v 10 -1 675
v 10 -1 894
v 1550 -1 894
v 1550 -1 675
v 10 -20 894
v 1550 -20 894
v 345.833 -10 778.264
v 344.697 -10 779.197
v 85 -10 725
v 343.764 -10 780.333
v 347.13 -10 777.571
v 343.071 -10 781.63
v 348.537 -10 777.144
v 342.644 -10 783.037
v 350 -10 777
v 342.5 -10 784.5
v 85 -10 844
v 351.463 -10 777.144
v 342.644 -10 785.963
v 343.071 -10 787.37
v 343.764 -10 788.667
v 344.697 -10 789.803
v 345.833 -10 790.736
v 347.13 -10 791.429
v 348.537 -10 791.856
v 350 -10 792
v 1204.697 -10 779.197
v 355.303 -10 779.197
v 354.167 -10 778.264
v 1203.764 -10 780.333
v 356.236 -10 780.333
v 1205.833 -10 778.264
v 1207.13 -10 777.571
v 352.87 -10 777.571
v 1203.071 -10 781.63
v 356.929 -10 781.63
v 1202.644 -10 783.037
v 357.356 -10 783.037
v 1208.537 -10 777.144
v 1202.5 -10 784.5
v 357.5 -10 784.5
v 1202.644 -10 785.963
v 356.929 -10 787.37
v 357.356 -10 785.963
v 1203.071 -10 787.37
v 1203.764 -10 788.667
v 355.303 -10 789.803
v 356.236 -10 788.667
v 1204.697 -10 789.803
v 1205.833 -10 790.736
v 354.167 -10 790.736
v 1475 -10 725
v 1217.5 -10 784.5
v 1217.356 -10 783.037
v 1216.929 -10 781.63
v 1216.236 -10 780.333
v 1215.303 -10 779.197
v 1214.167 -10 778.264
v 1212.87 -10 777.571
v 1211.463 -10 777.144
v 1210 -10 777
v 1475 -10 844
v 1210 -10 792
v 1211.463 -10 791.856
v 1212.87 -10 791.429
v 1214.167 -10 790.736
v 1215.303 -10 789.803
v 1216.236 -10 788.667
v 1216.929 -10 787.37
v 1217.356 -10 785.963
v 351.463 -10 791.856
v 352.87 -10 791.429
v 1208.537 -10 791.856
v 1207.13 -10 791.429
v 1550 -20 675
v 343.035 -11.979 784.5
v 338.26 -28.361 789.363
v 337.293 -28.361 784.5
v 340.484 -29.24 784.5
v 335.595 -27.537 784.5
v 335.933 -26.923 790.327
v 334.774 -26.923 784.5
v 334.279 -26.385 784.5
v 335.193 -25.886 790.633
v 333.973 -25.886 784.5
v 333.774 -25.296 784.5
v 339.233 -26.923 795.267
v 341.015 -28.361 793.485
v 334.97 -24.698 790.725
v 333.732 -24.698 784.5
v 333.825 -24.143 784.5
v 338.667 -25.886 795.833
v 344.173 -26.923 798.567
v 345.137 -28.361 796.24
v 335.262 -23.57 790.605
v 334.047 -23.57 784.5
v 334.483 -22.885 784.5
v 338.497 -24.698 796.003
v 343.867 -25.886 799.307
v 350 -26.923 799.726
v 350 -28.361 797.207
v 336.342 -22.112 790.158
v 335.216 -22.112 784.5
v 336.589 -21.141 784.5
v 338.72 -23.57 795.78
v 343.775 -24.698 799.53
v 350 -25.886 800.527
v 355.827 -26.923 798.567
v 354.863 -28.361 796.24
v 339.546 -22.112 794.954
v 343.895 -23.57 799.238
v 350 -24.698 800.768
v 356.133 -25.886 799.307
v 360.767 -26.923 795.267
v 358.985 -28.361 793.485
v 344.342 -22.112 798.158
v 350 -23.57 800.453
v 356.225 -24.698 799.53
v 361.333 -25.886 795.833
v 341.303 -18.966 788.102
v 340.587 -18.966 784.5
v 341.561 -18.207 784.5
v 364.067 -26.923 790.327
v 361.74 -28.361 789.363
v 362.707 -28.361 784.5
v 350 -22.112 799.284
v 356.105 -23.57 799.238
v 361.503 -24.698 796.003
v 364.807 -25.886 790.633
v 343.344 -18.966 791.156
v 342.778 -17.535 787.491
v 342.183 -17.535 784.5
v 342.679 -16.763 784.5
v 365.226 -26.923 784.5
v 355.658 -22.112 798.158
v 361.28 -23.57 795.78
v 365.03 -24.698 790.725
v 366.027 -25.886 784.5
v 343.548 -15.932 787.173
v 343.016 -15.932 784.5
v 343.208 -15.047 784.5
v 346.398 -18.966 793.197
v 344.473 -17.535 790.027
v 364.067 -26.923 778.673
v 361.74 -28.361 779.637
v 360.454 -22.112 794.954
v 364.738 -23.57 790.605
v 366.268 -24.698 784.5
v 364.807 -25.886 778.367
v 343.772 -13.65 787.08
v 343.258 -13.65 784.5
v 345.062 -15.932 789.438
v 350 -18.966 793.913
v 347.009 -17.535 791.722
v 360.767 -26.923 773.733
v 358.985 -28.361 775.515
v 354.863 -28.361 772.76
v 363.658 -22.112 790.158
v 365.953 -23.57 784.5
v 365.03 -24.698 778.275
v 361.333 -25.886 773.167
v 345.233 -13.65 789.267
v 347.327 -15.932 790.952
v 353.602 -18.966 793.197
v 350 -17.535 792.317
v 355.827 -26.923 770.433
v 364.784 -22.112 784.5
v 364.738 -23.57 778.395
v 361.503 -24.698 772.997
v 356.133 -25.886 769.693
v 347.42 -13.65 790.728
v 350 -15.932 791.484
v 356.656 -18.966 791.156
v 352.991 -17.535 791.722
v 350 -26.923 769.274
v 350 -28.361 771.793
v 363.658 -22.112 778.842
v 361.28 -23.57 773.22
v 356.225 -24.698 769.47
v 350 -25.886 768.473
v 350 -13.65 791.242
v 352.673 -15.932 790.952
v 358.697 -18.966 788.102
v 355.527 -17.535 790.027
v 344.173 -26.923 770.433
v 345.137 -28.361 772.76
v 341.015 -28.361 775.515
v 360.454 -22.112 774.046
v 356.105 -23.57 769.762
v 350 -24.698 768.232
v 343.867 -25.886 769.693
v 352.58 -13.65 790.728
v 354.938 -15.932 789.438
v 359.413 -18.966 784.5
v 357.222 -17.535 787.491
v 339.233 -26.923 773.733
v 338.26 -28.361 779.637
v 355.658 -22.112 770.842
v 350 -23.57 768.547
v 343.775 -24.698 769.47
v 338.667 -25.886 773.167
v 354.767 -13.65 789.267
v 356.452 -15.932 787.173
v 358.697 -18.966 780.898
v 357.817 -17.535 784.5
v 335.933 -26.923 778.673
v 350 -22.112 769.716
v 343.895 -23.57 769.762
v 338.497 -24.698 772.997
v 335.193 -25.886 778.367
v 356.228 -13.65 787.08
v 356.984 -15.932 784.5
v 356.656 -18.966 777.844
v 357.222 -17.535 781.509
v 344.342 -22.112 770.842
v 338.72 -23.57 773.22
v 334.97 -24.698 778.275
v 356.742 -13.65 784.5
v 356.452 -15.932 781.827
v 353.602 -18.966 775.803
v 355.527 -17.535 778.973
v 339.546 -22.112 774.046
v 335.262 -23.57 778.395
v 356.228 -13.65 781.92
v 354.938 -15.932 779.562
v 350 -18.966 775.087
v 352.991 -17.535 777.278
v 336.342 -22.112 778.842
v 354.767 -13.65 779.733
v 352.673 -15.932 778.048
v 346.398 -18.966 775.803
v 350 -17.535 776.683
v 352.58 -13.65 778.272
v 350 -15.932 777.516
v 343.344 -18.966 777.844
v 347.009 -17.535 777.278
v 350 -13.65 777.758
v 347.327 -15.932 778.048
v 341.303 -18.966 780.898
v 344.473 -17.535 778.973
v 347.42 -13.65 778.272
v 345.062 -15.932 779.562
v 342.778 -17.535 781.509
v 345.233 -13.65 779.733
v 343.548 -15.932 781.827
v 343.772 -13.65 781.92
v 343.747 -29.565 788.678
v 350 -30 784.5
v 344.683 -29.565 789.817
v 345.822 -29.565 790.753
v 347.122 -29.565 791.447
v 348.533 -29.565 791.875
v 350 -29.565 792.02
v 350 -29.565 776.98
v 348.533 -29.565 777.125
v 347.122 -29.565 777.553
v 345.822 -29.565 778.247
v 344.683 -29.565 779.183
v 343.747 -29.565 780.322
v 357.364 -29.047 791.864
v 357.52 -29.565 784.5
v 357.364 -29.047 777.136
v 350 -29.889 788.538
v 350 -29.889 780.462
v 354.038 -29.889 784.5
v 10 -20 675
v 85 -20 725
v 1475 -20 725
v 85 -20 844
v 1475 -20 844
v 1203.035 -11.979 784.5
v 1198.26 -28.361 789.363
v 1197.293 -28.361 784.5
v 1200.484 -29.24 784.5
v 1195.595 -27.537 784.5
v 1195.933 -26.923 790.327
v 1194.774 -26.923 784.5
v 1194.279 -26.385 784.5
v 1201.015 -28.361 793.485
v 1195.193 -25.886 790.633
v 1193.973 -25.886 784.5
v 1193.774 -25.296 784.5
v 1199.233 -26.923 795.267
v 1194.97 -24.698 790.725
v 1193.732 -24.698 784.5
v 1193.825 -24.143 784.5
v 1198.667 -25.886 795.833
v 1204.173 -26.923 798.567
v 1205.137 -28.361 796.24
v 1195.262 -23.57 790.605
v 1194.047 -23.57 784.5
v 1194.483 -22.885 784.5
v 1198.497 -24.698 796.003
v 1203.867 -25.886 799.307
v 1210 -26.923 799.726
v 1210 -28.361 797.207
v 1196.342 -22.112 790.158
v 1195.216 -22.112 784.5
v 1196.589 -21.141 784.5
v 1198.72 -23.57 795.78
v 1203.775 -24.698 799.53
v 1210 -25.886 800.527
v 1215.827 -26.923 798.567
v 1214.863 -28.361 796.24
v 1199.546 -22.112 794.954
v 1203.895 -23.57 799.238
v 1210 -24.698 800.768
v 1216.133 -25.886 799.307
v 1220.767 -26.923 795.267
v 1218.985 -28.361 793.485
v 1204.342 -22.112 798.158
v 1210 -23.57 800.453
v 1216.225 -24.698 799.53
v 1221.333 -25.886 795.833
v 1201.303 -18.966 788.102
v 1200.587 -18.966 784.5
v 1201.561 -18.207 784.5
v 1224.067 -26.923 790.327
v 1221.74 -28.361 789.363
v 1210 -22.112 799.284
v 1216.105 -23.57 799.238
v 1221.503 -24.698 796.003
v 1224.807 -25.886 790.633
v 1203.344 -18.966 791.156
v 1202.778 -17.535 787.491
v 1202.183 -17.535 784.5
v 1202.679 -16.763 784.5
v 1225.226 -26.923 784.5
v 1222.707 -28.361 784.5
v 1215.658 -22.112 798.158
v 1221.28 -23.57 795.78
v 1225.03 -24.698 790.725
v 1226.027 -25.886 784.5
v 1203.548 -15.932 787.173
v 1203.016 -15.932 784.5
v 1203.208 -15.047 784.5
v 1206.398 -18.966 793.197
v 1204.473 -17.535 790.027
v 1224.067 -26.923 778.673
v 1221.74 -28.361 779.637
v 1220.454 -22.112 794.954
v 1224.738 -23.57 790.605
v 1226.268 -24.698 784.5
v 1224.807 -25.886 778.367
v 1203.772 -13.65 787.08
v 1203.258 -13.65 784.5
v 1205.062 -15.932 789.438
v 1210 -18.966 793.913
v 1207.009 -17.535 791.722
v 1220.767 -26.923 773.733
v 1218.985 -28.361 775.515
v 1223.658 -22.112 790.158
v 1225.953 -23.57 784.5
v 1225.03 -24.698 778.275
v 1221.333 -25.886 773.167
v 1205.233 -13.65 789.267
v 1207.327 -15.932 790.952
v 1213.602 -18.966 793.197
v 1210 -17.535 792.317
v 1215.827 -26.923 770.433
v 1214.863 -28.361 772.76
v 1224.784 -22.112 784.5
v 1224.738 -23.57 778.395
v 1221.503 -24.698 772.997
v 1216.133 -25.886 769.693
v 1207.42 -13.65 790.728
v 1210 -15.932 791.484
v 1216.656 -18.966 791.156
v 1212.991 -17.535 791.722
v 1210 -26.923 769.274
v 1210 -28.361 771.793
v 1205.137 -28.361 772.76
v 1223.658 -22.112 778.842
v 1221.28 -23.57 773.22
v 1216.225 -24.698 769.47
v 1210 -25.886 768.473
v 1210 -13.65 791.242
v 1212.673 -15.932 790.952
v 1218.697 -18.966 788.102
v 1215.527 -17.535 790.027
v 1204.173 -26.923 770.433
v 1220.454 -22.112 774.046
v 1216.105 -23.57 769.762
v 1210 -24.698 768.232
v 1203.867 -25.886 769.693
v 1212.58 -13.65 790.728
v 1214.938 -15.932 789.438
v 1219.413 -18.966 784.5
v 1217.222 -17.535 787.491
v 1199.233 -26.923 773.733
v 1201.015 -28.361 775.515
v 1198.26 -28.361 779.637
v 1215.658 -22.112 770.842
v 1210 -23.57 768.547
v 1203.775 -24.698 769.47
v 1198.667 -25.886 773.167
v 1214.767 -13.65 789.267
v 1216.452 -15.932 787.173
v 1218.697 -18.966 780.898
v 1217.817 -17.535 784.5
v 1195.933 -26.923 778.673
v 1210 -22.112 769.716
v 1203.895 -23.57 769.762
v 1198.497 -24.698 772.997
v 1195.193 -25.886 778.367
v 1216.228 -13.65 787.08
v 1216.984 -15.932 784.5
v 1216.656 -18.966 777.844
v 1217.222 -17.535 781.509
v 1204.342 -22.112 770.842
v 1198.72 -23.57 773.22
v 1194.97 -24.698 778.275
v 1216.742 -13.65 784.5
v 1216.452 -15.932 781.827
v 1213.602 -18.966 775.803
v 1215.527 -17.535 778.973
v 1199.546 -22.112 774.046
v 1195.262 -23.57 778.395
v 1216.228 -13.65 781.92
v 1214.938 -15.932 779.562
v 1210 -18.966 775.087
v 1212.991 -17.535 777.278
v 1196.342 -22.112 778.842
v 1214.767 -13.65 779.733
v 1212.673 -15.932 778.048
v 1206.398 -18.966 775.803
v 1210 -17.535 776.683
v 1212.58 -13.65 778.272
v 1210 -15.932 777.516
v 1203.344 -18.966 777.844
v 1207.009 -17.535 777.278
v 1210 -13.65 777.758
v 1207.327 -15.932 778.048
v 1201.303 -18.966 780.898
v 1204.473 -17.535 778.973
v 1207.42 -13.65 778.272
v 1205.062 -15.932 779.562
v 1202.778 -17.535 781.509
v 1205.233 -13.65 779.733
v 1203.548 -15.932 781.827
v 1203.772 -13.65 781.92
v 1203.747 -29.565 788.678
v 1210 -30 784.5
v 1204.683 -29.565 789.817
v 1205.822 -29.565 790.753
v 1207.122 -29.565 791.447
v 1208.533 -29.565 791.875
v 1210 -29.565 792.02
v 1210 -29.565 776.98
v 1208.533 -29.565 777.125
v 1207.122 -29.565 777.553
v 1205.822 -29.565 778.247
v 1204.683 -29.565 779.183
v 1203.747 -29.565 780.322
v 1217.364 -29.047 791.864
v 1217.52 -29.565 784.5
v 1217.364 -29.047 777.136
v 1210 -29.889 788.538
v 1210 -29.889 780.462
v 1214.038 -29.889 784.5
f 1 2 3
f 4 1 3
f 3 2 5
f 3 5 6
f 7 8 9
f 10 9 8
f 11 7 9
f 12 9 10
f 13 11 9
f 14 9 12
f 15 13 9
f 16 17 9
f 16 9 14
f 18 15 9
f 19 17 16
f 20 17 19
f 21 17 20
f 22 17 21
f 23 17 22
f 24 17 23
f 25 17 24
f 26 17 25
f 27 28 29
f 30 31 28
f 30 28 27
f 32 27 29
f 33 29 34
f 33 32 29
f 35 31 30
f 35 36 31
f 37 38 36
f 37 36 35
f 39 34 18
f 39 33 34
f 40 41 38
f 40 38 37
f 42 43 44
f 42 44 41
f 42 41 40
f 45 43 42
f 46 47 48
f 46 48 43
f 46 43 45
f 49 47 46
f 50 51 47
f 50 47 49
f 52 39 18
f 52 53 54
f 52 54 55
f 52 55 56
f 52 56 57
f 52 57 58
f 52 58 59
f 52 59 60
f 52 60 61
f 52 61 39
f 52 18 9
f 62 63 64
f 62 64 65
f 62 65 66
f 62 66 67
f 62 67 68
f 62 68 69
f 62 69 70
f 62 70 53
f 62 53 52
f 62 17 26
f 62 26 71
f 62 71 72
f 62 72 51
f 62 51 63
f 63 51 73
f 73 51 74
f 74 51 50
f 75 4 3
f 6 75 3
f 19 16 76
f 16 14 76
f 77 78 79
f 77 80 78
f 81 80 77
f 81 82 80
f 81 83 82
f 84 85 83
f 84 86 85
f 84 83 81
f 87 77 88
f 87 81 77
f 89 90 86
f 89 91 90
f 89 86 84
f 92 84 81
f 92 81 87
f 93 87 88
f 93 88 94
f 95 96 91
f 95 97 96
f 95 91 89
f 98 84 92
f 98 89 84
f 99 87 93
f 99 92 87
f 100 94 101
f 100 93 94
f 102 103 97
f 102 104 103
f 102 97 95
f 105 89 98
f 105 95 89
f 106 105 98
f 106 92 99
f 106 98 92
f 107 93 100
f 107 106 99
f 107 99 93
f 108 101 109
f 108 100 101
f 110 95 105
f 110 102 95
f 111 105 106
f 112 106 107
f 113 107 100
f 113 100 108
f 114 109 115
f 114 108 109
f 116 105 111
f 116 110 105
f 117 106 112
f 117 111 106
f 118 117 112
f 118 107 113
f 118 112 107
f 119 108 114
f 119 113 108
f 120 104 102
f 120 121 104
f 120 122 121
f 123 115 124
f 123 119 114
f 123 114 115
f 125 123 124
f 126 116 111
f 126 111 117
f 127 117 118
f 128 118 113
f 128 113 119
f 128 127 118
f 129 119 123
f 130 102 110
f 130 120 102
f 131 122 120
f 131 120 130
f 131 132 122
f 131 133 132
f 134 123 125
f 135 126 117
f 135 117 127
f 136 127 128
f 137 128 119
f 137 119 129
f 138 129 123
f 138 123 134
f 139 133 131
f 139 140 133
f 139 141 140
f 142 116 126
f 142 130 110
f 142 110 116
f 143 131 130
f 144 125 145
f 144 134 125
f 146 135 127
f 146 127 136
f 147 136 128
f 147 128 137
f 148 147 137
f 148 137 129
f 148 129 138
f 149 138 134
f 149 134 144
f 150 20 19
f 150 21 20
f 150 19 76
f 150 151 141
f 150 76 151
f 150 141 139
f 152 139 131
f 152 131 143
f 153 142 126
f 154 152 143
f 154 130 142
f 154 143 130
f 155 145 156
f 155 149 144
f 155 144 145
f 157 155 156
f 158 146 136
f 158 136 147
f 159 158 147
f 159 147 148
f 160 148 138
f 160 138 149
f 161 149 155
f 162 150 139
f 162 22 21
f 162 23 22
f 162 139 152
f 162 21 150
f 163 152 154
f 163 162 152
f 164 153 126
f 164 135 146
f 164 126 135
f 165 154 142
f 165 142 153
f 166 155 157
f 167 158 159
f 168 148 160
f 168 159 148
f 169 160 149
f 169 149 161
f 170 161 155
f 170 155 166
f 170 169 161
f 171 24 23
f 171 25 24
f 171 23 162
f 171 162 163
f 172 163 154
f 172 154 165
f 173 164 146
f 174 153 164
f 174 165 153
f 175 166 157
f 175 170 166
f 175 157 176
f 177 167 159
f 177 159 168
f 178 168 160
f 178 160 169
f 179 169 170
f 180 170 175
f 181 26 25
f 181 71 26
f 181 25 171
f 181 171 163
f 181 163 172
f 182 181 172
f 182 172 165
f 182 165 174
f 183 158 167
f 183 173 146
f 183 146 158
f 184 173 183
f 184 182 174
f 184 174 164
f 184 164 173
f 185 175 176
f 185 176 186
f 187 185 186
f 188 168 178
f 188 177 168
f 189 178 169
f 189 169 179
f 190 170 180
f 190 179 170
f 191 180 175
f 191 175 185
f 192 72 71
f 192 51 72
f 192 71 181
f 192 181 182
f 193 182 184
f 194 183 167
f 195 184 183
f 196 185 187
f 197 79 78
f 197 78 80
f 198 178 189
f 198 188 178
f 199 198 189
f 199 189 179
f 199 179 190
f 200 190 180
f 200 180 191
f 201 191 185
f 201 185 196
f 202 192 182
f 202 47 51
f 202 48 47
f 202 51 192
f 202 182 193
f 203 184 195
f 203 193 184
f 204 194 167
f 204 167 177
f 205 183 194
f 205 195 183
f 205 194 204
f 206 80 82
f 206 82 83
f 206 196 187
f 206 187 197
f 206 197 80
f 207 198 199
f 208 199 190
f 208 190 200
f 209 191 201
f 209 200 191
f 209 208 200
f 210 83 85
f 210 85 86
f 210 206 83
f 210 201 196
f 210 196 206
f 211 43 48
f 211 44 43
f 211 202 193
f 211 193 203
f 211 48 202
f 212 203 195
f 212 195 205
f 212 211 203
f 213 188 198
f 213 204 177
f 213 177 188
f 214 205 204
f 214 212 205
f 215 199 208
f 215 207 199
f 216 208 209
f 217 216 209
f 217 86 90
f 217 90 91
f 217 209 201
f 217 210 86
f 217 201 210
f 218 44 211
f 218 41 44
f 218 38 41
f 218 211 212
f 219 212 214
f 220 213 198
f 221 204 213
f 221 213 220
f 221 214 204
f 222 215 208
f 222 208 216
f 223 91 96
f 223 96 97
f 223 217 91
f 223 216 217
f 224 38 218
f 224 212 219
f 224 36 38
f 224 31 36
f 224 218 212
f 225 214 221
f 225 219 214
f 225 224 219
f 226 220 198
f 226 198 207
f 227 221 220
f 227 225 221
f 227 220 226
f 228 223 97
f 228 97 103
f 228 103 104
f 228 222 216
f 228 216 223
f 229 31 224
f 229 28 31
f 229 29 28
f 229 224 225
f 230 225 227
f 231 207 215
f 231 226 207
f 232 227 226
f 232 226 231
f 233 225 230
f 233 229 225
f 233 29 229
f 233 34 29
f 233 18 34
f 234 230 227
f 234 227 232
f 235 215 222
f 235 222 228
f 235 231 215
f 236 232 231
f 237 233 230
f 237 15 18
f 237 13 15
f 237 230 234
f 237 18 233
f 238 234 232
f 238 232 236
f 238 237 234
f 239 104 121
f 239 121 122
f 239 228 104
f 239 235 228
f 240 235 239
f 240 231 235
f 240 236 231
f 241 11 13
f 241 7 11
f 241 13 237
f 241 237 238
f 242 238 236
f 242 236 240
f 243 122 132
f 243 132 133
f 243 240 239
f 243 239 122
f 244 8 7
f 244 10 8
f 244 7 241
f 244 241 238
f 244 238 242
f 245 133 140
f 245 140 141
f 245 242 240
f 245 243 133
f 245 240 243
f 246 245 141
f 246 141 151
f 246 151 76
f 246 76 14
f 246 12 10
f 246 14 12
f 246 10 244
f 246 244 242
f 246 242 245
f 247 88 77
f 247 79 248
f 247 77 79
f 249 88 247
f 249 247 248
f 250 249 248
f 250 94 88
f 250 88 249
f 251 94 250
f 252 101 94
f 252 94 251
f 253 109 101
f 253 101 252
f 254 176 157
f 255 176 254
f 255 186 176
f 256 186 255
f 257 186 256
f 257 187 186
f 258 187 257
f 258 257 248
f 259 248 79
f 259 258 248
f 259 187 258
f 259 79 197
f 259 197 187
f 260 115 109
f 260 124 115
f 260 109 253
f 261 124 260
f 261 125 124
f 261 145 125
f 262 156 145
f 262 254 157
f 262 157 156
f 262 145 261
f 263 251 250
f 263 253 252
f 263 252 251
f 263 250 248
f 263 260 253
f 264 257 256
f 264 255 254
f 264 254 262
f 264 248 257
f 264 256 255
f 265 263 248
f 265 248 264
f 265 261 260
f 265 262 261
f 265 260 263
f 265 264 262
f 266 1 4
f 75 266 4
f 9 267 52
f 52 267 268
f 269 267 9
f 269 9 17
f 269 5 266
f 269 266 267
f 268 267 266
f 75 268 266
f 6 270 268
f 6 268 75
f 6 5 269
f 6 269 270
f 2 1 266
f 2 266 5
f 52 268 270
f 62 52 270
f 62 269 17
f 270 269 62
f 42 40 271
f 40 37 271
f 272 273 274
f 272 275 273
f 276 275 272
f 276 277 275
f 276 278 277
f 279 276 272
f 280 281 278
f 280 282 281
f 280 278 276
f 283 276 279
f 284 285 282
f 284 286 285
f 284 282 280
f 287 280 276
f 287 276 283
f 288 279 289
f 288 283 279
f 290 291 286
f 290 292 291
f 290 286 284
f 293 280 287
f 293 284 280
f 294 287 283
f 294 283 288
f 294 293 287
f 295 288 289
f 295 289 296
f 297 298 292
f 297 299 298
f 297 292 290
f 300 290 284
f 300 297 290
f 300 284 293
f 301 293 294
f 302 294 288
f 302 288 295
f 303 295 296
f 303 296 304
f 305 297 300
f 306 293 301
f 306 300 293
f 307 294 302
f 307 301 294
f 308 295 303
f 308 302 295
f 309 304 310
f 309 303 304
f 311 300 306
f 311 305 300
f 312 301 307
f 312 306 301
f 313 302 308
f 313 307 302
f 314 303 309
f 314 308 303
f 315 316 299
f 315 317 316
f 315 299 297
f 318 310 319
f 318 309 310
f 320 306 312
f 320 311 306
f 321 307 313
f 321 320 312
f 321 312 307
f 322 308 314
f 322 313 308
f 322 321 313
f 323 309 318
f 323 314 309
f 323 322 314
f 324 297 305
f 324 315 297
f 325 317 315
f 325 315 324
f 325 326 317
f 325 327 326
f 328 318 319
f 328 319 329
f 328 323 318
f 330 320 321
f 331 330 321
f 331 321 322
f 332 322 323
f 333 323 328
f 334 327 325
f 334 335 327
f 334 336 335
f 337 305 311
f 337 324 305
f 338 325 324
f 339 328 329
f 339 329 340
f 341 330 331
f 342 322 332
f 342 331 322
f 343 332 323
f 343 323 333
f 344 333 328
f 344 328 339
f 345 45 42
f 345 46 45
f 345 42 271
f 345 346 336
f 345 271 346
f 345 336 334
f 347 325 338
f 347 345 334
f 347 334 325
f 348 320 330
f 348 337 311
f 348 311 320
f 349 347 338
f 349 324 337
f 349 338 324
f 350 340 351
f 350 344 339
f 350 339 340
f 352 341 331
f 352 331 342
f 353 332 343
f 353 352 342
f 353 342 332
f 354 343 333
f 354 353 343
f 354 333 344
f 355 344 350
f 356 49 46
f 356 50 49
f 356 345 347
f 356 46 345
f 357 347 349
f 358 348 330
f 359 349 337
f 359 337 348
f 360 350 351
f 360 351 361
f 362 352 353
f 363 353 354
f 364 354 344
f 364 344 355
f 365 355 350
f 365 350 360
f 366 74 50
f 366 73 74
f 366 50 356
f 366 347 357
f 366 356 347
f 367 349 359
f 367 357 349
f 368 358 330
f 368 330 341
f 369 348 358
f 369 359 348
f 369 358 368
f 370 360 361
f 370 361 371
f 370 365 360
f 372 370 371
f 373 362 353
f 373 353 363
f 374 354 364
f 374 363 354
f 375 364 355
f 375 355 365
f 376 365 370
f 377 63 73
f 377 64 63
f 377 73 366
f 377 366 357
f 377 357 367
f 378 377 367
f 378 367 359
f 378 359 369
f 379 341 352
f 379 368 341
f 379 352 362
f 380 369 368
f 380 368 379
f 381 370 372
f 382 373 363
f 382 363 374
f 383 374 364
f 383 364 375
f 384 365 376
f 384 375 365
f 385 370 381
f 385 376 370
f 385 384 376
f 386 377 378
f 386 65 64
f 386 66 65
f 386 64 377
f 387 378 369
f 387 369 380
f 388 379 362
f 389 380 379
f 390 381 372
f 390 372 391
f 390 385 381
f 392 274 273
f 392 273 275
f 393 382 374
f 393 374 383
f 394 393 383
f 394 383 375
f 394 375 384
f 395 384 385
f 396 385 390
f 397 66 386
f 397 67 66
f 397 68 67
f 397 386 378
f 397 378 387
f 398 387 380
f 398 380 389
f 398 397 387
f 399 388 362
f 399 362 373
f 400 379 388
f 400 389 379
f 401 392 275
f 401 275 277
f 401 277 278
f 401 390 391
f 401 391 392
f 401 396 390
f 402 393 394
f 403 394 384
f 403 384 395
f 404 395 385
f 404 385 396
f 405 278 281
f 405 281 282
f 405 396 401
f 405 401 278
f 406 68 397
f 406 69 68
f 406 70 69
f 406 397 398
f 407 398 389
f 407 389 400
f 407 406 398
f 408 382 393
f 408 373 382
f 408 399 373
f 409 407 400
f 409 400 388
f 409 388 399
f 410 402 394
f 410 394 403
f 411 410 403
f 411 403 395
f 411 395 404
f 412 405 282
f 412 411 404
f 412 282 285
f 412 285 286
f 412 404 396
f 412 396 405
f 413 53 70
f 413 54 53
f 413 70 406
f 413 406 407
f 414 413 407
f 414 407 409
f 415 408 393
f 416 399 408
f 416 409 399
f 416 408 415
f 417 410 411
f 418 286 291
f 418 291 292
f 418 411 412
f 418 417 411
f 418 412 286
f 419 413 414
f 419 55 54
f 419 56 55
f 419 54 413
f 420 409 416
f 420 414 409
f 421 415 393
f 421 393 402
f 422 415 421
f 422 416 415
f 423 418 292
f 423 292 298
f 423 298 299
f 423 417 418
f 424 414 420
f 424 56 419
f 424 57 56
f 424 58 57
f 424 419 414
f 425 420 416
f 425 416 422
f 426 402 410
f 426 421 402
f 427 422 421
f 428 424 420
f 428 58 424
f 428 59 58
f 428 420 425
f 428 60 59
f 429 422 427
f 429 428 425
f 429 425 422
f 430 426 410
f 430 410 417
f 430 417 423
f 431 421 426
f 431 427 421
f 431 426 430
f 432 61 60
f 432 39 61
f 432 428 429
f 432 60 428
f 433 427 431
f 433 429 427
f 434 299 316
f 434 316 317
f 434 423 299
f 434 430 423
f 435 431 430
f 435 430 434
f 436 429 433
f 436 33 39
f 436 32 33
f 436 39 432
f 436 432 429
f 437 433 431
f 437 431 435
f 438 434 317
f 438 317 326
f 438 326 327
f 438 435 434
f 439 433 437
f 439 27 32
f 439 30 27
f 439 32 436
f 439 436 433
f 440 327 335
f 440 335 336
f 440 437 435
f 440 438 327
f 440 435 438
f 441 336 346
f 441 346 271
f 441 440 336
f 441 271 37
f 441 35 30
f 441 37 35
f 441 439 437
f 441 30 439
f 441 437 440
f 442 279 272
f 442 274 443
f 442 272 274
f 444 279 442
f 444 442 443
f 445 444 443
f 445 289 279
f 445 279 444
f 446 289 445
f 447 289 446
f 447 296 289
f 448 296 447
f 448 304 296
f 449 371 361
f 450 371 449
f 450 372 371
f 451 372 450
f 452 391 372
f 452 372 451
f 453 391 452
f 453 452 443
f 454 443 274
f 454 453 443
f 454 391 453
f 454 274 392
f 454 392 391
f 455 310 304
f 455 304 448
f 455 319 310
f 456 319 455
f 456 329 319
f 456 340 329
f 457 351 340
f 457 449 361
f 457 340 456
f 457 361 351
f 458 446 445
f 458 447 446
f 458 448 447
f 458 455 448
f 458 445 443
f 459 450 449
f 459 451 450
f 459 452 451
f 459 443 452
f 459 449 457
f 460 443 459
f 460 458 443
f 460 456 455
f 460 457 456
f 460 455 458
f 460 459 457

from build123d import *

# Parameters (mm, degrees)
CLONE2D007_W    = 1540
CLONE2D007_H    = 219
PAD013_DEPTH    = 19
SKETCH034_W     = 1390
SKETCH034_H     = 119
POCKET013_DEPTH = 10


with BuildPart() as part:
    # Clone2D007 → Pad013 (new body)
    with BuildSketch(Plane.XZ):
        with Locations((770, 109.5)):
            Rectangle(CLONE2D007_W, CLONE2D007_H)
    extrude(amount=PAD013_DEPTH)

    # Sketch034 (on Face6 of Pad013) → Pocket013 (cut)
    with BuildSketch(Plane.XZ.offset(19)):
        with Locations((770, 109.5)):
            Rectangle(SKETCH034_W, SKETCH034_H)
    extrude(amount=-POCKET013_DEPTH, mode=Mode.SUBTRACT)

    # Clone2D009 → Revolution004 (revolve)
    with BuildSketch(Plane(origin=(340, -9, 109.5), x_dir=(1, 0, 0), z_dir=(0, 0, 1))):
        with BuildLine():
            Line((0, 0), (0, -20))
            add(Edge.make_bspline(
                [(0, -20), (-18, -20), (-18, -9.133286), (-4.506424, -9.133286), (-7.5, 0)],
                knots=[0, 0, 0, 0, 0.5, 1, 1, 1, 1], degree=3, weights=[7, 6.116989, 5.810816, 6.060123, 5.999522]))
            Line((-7.5, 0), (0, 0))
        make_face()
    revolve(axis=Axis((340, -9, 109.5), (0, 1, 0)))

    # Clone2D008 → Revolution010 (revolve)
    with BuildSketch(Plane(origin=(1200, -9, 109.5), x_dir=(1, 0, 0), z_dir=(0, 0, 1))):
        with BuildLine():
            Line((0, 0), (0, -20))
            add(Edge.make_bspline(
                [(0, -20), (-18, -20), (-18, -9.133286), (-4.506424, -9.133286), (-7.5, 0)],
                knots=[0, 0, 0, 0, 0.5, 1, 1, 1, 1], degree=3, weights=[7, 6.116989, 5.810816, 6.060123, 5.999522]))
            Line((-7.5, 0), (0, 0))
        make_face()
    revolve(axis=Axis((1200, -9, 109.5), (0, 1, 0)))


with BuildPart() as part_1:
    # Body015 placement: moved
    add(part.part.moved(Location((10, -1, 675))))


solid = part_1.part
